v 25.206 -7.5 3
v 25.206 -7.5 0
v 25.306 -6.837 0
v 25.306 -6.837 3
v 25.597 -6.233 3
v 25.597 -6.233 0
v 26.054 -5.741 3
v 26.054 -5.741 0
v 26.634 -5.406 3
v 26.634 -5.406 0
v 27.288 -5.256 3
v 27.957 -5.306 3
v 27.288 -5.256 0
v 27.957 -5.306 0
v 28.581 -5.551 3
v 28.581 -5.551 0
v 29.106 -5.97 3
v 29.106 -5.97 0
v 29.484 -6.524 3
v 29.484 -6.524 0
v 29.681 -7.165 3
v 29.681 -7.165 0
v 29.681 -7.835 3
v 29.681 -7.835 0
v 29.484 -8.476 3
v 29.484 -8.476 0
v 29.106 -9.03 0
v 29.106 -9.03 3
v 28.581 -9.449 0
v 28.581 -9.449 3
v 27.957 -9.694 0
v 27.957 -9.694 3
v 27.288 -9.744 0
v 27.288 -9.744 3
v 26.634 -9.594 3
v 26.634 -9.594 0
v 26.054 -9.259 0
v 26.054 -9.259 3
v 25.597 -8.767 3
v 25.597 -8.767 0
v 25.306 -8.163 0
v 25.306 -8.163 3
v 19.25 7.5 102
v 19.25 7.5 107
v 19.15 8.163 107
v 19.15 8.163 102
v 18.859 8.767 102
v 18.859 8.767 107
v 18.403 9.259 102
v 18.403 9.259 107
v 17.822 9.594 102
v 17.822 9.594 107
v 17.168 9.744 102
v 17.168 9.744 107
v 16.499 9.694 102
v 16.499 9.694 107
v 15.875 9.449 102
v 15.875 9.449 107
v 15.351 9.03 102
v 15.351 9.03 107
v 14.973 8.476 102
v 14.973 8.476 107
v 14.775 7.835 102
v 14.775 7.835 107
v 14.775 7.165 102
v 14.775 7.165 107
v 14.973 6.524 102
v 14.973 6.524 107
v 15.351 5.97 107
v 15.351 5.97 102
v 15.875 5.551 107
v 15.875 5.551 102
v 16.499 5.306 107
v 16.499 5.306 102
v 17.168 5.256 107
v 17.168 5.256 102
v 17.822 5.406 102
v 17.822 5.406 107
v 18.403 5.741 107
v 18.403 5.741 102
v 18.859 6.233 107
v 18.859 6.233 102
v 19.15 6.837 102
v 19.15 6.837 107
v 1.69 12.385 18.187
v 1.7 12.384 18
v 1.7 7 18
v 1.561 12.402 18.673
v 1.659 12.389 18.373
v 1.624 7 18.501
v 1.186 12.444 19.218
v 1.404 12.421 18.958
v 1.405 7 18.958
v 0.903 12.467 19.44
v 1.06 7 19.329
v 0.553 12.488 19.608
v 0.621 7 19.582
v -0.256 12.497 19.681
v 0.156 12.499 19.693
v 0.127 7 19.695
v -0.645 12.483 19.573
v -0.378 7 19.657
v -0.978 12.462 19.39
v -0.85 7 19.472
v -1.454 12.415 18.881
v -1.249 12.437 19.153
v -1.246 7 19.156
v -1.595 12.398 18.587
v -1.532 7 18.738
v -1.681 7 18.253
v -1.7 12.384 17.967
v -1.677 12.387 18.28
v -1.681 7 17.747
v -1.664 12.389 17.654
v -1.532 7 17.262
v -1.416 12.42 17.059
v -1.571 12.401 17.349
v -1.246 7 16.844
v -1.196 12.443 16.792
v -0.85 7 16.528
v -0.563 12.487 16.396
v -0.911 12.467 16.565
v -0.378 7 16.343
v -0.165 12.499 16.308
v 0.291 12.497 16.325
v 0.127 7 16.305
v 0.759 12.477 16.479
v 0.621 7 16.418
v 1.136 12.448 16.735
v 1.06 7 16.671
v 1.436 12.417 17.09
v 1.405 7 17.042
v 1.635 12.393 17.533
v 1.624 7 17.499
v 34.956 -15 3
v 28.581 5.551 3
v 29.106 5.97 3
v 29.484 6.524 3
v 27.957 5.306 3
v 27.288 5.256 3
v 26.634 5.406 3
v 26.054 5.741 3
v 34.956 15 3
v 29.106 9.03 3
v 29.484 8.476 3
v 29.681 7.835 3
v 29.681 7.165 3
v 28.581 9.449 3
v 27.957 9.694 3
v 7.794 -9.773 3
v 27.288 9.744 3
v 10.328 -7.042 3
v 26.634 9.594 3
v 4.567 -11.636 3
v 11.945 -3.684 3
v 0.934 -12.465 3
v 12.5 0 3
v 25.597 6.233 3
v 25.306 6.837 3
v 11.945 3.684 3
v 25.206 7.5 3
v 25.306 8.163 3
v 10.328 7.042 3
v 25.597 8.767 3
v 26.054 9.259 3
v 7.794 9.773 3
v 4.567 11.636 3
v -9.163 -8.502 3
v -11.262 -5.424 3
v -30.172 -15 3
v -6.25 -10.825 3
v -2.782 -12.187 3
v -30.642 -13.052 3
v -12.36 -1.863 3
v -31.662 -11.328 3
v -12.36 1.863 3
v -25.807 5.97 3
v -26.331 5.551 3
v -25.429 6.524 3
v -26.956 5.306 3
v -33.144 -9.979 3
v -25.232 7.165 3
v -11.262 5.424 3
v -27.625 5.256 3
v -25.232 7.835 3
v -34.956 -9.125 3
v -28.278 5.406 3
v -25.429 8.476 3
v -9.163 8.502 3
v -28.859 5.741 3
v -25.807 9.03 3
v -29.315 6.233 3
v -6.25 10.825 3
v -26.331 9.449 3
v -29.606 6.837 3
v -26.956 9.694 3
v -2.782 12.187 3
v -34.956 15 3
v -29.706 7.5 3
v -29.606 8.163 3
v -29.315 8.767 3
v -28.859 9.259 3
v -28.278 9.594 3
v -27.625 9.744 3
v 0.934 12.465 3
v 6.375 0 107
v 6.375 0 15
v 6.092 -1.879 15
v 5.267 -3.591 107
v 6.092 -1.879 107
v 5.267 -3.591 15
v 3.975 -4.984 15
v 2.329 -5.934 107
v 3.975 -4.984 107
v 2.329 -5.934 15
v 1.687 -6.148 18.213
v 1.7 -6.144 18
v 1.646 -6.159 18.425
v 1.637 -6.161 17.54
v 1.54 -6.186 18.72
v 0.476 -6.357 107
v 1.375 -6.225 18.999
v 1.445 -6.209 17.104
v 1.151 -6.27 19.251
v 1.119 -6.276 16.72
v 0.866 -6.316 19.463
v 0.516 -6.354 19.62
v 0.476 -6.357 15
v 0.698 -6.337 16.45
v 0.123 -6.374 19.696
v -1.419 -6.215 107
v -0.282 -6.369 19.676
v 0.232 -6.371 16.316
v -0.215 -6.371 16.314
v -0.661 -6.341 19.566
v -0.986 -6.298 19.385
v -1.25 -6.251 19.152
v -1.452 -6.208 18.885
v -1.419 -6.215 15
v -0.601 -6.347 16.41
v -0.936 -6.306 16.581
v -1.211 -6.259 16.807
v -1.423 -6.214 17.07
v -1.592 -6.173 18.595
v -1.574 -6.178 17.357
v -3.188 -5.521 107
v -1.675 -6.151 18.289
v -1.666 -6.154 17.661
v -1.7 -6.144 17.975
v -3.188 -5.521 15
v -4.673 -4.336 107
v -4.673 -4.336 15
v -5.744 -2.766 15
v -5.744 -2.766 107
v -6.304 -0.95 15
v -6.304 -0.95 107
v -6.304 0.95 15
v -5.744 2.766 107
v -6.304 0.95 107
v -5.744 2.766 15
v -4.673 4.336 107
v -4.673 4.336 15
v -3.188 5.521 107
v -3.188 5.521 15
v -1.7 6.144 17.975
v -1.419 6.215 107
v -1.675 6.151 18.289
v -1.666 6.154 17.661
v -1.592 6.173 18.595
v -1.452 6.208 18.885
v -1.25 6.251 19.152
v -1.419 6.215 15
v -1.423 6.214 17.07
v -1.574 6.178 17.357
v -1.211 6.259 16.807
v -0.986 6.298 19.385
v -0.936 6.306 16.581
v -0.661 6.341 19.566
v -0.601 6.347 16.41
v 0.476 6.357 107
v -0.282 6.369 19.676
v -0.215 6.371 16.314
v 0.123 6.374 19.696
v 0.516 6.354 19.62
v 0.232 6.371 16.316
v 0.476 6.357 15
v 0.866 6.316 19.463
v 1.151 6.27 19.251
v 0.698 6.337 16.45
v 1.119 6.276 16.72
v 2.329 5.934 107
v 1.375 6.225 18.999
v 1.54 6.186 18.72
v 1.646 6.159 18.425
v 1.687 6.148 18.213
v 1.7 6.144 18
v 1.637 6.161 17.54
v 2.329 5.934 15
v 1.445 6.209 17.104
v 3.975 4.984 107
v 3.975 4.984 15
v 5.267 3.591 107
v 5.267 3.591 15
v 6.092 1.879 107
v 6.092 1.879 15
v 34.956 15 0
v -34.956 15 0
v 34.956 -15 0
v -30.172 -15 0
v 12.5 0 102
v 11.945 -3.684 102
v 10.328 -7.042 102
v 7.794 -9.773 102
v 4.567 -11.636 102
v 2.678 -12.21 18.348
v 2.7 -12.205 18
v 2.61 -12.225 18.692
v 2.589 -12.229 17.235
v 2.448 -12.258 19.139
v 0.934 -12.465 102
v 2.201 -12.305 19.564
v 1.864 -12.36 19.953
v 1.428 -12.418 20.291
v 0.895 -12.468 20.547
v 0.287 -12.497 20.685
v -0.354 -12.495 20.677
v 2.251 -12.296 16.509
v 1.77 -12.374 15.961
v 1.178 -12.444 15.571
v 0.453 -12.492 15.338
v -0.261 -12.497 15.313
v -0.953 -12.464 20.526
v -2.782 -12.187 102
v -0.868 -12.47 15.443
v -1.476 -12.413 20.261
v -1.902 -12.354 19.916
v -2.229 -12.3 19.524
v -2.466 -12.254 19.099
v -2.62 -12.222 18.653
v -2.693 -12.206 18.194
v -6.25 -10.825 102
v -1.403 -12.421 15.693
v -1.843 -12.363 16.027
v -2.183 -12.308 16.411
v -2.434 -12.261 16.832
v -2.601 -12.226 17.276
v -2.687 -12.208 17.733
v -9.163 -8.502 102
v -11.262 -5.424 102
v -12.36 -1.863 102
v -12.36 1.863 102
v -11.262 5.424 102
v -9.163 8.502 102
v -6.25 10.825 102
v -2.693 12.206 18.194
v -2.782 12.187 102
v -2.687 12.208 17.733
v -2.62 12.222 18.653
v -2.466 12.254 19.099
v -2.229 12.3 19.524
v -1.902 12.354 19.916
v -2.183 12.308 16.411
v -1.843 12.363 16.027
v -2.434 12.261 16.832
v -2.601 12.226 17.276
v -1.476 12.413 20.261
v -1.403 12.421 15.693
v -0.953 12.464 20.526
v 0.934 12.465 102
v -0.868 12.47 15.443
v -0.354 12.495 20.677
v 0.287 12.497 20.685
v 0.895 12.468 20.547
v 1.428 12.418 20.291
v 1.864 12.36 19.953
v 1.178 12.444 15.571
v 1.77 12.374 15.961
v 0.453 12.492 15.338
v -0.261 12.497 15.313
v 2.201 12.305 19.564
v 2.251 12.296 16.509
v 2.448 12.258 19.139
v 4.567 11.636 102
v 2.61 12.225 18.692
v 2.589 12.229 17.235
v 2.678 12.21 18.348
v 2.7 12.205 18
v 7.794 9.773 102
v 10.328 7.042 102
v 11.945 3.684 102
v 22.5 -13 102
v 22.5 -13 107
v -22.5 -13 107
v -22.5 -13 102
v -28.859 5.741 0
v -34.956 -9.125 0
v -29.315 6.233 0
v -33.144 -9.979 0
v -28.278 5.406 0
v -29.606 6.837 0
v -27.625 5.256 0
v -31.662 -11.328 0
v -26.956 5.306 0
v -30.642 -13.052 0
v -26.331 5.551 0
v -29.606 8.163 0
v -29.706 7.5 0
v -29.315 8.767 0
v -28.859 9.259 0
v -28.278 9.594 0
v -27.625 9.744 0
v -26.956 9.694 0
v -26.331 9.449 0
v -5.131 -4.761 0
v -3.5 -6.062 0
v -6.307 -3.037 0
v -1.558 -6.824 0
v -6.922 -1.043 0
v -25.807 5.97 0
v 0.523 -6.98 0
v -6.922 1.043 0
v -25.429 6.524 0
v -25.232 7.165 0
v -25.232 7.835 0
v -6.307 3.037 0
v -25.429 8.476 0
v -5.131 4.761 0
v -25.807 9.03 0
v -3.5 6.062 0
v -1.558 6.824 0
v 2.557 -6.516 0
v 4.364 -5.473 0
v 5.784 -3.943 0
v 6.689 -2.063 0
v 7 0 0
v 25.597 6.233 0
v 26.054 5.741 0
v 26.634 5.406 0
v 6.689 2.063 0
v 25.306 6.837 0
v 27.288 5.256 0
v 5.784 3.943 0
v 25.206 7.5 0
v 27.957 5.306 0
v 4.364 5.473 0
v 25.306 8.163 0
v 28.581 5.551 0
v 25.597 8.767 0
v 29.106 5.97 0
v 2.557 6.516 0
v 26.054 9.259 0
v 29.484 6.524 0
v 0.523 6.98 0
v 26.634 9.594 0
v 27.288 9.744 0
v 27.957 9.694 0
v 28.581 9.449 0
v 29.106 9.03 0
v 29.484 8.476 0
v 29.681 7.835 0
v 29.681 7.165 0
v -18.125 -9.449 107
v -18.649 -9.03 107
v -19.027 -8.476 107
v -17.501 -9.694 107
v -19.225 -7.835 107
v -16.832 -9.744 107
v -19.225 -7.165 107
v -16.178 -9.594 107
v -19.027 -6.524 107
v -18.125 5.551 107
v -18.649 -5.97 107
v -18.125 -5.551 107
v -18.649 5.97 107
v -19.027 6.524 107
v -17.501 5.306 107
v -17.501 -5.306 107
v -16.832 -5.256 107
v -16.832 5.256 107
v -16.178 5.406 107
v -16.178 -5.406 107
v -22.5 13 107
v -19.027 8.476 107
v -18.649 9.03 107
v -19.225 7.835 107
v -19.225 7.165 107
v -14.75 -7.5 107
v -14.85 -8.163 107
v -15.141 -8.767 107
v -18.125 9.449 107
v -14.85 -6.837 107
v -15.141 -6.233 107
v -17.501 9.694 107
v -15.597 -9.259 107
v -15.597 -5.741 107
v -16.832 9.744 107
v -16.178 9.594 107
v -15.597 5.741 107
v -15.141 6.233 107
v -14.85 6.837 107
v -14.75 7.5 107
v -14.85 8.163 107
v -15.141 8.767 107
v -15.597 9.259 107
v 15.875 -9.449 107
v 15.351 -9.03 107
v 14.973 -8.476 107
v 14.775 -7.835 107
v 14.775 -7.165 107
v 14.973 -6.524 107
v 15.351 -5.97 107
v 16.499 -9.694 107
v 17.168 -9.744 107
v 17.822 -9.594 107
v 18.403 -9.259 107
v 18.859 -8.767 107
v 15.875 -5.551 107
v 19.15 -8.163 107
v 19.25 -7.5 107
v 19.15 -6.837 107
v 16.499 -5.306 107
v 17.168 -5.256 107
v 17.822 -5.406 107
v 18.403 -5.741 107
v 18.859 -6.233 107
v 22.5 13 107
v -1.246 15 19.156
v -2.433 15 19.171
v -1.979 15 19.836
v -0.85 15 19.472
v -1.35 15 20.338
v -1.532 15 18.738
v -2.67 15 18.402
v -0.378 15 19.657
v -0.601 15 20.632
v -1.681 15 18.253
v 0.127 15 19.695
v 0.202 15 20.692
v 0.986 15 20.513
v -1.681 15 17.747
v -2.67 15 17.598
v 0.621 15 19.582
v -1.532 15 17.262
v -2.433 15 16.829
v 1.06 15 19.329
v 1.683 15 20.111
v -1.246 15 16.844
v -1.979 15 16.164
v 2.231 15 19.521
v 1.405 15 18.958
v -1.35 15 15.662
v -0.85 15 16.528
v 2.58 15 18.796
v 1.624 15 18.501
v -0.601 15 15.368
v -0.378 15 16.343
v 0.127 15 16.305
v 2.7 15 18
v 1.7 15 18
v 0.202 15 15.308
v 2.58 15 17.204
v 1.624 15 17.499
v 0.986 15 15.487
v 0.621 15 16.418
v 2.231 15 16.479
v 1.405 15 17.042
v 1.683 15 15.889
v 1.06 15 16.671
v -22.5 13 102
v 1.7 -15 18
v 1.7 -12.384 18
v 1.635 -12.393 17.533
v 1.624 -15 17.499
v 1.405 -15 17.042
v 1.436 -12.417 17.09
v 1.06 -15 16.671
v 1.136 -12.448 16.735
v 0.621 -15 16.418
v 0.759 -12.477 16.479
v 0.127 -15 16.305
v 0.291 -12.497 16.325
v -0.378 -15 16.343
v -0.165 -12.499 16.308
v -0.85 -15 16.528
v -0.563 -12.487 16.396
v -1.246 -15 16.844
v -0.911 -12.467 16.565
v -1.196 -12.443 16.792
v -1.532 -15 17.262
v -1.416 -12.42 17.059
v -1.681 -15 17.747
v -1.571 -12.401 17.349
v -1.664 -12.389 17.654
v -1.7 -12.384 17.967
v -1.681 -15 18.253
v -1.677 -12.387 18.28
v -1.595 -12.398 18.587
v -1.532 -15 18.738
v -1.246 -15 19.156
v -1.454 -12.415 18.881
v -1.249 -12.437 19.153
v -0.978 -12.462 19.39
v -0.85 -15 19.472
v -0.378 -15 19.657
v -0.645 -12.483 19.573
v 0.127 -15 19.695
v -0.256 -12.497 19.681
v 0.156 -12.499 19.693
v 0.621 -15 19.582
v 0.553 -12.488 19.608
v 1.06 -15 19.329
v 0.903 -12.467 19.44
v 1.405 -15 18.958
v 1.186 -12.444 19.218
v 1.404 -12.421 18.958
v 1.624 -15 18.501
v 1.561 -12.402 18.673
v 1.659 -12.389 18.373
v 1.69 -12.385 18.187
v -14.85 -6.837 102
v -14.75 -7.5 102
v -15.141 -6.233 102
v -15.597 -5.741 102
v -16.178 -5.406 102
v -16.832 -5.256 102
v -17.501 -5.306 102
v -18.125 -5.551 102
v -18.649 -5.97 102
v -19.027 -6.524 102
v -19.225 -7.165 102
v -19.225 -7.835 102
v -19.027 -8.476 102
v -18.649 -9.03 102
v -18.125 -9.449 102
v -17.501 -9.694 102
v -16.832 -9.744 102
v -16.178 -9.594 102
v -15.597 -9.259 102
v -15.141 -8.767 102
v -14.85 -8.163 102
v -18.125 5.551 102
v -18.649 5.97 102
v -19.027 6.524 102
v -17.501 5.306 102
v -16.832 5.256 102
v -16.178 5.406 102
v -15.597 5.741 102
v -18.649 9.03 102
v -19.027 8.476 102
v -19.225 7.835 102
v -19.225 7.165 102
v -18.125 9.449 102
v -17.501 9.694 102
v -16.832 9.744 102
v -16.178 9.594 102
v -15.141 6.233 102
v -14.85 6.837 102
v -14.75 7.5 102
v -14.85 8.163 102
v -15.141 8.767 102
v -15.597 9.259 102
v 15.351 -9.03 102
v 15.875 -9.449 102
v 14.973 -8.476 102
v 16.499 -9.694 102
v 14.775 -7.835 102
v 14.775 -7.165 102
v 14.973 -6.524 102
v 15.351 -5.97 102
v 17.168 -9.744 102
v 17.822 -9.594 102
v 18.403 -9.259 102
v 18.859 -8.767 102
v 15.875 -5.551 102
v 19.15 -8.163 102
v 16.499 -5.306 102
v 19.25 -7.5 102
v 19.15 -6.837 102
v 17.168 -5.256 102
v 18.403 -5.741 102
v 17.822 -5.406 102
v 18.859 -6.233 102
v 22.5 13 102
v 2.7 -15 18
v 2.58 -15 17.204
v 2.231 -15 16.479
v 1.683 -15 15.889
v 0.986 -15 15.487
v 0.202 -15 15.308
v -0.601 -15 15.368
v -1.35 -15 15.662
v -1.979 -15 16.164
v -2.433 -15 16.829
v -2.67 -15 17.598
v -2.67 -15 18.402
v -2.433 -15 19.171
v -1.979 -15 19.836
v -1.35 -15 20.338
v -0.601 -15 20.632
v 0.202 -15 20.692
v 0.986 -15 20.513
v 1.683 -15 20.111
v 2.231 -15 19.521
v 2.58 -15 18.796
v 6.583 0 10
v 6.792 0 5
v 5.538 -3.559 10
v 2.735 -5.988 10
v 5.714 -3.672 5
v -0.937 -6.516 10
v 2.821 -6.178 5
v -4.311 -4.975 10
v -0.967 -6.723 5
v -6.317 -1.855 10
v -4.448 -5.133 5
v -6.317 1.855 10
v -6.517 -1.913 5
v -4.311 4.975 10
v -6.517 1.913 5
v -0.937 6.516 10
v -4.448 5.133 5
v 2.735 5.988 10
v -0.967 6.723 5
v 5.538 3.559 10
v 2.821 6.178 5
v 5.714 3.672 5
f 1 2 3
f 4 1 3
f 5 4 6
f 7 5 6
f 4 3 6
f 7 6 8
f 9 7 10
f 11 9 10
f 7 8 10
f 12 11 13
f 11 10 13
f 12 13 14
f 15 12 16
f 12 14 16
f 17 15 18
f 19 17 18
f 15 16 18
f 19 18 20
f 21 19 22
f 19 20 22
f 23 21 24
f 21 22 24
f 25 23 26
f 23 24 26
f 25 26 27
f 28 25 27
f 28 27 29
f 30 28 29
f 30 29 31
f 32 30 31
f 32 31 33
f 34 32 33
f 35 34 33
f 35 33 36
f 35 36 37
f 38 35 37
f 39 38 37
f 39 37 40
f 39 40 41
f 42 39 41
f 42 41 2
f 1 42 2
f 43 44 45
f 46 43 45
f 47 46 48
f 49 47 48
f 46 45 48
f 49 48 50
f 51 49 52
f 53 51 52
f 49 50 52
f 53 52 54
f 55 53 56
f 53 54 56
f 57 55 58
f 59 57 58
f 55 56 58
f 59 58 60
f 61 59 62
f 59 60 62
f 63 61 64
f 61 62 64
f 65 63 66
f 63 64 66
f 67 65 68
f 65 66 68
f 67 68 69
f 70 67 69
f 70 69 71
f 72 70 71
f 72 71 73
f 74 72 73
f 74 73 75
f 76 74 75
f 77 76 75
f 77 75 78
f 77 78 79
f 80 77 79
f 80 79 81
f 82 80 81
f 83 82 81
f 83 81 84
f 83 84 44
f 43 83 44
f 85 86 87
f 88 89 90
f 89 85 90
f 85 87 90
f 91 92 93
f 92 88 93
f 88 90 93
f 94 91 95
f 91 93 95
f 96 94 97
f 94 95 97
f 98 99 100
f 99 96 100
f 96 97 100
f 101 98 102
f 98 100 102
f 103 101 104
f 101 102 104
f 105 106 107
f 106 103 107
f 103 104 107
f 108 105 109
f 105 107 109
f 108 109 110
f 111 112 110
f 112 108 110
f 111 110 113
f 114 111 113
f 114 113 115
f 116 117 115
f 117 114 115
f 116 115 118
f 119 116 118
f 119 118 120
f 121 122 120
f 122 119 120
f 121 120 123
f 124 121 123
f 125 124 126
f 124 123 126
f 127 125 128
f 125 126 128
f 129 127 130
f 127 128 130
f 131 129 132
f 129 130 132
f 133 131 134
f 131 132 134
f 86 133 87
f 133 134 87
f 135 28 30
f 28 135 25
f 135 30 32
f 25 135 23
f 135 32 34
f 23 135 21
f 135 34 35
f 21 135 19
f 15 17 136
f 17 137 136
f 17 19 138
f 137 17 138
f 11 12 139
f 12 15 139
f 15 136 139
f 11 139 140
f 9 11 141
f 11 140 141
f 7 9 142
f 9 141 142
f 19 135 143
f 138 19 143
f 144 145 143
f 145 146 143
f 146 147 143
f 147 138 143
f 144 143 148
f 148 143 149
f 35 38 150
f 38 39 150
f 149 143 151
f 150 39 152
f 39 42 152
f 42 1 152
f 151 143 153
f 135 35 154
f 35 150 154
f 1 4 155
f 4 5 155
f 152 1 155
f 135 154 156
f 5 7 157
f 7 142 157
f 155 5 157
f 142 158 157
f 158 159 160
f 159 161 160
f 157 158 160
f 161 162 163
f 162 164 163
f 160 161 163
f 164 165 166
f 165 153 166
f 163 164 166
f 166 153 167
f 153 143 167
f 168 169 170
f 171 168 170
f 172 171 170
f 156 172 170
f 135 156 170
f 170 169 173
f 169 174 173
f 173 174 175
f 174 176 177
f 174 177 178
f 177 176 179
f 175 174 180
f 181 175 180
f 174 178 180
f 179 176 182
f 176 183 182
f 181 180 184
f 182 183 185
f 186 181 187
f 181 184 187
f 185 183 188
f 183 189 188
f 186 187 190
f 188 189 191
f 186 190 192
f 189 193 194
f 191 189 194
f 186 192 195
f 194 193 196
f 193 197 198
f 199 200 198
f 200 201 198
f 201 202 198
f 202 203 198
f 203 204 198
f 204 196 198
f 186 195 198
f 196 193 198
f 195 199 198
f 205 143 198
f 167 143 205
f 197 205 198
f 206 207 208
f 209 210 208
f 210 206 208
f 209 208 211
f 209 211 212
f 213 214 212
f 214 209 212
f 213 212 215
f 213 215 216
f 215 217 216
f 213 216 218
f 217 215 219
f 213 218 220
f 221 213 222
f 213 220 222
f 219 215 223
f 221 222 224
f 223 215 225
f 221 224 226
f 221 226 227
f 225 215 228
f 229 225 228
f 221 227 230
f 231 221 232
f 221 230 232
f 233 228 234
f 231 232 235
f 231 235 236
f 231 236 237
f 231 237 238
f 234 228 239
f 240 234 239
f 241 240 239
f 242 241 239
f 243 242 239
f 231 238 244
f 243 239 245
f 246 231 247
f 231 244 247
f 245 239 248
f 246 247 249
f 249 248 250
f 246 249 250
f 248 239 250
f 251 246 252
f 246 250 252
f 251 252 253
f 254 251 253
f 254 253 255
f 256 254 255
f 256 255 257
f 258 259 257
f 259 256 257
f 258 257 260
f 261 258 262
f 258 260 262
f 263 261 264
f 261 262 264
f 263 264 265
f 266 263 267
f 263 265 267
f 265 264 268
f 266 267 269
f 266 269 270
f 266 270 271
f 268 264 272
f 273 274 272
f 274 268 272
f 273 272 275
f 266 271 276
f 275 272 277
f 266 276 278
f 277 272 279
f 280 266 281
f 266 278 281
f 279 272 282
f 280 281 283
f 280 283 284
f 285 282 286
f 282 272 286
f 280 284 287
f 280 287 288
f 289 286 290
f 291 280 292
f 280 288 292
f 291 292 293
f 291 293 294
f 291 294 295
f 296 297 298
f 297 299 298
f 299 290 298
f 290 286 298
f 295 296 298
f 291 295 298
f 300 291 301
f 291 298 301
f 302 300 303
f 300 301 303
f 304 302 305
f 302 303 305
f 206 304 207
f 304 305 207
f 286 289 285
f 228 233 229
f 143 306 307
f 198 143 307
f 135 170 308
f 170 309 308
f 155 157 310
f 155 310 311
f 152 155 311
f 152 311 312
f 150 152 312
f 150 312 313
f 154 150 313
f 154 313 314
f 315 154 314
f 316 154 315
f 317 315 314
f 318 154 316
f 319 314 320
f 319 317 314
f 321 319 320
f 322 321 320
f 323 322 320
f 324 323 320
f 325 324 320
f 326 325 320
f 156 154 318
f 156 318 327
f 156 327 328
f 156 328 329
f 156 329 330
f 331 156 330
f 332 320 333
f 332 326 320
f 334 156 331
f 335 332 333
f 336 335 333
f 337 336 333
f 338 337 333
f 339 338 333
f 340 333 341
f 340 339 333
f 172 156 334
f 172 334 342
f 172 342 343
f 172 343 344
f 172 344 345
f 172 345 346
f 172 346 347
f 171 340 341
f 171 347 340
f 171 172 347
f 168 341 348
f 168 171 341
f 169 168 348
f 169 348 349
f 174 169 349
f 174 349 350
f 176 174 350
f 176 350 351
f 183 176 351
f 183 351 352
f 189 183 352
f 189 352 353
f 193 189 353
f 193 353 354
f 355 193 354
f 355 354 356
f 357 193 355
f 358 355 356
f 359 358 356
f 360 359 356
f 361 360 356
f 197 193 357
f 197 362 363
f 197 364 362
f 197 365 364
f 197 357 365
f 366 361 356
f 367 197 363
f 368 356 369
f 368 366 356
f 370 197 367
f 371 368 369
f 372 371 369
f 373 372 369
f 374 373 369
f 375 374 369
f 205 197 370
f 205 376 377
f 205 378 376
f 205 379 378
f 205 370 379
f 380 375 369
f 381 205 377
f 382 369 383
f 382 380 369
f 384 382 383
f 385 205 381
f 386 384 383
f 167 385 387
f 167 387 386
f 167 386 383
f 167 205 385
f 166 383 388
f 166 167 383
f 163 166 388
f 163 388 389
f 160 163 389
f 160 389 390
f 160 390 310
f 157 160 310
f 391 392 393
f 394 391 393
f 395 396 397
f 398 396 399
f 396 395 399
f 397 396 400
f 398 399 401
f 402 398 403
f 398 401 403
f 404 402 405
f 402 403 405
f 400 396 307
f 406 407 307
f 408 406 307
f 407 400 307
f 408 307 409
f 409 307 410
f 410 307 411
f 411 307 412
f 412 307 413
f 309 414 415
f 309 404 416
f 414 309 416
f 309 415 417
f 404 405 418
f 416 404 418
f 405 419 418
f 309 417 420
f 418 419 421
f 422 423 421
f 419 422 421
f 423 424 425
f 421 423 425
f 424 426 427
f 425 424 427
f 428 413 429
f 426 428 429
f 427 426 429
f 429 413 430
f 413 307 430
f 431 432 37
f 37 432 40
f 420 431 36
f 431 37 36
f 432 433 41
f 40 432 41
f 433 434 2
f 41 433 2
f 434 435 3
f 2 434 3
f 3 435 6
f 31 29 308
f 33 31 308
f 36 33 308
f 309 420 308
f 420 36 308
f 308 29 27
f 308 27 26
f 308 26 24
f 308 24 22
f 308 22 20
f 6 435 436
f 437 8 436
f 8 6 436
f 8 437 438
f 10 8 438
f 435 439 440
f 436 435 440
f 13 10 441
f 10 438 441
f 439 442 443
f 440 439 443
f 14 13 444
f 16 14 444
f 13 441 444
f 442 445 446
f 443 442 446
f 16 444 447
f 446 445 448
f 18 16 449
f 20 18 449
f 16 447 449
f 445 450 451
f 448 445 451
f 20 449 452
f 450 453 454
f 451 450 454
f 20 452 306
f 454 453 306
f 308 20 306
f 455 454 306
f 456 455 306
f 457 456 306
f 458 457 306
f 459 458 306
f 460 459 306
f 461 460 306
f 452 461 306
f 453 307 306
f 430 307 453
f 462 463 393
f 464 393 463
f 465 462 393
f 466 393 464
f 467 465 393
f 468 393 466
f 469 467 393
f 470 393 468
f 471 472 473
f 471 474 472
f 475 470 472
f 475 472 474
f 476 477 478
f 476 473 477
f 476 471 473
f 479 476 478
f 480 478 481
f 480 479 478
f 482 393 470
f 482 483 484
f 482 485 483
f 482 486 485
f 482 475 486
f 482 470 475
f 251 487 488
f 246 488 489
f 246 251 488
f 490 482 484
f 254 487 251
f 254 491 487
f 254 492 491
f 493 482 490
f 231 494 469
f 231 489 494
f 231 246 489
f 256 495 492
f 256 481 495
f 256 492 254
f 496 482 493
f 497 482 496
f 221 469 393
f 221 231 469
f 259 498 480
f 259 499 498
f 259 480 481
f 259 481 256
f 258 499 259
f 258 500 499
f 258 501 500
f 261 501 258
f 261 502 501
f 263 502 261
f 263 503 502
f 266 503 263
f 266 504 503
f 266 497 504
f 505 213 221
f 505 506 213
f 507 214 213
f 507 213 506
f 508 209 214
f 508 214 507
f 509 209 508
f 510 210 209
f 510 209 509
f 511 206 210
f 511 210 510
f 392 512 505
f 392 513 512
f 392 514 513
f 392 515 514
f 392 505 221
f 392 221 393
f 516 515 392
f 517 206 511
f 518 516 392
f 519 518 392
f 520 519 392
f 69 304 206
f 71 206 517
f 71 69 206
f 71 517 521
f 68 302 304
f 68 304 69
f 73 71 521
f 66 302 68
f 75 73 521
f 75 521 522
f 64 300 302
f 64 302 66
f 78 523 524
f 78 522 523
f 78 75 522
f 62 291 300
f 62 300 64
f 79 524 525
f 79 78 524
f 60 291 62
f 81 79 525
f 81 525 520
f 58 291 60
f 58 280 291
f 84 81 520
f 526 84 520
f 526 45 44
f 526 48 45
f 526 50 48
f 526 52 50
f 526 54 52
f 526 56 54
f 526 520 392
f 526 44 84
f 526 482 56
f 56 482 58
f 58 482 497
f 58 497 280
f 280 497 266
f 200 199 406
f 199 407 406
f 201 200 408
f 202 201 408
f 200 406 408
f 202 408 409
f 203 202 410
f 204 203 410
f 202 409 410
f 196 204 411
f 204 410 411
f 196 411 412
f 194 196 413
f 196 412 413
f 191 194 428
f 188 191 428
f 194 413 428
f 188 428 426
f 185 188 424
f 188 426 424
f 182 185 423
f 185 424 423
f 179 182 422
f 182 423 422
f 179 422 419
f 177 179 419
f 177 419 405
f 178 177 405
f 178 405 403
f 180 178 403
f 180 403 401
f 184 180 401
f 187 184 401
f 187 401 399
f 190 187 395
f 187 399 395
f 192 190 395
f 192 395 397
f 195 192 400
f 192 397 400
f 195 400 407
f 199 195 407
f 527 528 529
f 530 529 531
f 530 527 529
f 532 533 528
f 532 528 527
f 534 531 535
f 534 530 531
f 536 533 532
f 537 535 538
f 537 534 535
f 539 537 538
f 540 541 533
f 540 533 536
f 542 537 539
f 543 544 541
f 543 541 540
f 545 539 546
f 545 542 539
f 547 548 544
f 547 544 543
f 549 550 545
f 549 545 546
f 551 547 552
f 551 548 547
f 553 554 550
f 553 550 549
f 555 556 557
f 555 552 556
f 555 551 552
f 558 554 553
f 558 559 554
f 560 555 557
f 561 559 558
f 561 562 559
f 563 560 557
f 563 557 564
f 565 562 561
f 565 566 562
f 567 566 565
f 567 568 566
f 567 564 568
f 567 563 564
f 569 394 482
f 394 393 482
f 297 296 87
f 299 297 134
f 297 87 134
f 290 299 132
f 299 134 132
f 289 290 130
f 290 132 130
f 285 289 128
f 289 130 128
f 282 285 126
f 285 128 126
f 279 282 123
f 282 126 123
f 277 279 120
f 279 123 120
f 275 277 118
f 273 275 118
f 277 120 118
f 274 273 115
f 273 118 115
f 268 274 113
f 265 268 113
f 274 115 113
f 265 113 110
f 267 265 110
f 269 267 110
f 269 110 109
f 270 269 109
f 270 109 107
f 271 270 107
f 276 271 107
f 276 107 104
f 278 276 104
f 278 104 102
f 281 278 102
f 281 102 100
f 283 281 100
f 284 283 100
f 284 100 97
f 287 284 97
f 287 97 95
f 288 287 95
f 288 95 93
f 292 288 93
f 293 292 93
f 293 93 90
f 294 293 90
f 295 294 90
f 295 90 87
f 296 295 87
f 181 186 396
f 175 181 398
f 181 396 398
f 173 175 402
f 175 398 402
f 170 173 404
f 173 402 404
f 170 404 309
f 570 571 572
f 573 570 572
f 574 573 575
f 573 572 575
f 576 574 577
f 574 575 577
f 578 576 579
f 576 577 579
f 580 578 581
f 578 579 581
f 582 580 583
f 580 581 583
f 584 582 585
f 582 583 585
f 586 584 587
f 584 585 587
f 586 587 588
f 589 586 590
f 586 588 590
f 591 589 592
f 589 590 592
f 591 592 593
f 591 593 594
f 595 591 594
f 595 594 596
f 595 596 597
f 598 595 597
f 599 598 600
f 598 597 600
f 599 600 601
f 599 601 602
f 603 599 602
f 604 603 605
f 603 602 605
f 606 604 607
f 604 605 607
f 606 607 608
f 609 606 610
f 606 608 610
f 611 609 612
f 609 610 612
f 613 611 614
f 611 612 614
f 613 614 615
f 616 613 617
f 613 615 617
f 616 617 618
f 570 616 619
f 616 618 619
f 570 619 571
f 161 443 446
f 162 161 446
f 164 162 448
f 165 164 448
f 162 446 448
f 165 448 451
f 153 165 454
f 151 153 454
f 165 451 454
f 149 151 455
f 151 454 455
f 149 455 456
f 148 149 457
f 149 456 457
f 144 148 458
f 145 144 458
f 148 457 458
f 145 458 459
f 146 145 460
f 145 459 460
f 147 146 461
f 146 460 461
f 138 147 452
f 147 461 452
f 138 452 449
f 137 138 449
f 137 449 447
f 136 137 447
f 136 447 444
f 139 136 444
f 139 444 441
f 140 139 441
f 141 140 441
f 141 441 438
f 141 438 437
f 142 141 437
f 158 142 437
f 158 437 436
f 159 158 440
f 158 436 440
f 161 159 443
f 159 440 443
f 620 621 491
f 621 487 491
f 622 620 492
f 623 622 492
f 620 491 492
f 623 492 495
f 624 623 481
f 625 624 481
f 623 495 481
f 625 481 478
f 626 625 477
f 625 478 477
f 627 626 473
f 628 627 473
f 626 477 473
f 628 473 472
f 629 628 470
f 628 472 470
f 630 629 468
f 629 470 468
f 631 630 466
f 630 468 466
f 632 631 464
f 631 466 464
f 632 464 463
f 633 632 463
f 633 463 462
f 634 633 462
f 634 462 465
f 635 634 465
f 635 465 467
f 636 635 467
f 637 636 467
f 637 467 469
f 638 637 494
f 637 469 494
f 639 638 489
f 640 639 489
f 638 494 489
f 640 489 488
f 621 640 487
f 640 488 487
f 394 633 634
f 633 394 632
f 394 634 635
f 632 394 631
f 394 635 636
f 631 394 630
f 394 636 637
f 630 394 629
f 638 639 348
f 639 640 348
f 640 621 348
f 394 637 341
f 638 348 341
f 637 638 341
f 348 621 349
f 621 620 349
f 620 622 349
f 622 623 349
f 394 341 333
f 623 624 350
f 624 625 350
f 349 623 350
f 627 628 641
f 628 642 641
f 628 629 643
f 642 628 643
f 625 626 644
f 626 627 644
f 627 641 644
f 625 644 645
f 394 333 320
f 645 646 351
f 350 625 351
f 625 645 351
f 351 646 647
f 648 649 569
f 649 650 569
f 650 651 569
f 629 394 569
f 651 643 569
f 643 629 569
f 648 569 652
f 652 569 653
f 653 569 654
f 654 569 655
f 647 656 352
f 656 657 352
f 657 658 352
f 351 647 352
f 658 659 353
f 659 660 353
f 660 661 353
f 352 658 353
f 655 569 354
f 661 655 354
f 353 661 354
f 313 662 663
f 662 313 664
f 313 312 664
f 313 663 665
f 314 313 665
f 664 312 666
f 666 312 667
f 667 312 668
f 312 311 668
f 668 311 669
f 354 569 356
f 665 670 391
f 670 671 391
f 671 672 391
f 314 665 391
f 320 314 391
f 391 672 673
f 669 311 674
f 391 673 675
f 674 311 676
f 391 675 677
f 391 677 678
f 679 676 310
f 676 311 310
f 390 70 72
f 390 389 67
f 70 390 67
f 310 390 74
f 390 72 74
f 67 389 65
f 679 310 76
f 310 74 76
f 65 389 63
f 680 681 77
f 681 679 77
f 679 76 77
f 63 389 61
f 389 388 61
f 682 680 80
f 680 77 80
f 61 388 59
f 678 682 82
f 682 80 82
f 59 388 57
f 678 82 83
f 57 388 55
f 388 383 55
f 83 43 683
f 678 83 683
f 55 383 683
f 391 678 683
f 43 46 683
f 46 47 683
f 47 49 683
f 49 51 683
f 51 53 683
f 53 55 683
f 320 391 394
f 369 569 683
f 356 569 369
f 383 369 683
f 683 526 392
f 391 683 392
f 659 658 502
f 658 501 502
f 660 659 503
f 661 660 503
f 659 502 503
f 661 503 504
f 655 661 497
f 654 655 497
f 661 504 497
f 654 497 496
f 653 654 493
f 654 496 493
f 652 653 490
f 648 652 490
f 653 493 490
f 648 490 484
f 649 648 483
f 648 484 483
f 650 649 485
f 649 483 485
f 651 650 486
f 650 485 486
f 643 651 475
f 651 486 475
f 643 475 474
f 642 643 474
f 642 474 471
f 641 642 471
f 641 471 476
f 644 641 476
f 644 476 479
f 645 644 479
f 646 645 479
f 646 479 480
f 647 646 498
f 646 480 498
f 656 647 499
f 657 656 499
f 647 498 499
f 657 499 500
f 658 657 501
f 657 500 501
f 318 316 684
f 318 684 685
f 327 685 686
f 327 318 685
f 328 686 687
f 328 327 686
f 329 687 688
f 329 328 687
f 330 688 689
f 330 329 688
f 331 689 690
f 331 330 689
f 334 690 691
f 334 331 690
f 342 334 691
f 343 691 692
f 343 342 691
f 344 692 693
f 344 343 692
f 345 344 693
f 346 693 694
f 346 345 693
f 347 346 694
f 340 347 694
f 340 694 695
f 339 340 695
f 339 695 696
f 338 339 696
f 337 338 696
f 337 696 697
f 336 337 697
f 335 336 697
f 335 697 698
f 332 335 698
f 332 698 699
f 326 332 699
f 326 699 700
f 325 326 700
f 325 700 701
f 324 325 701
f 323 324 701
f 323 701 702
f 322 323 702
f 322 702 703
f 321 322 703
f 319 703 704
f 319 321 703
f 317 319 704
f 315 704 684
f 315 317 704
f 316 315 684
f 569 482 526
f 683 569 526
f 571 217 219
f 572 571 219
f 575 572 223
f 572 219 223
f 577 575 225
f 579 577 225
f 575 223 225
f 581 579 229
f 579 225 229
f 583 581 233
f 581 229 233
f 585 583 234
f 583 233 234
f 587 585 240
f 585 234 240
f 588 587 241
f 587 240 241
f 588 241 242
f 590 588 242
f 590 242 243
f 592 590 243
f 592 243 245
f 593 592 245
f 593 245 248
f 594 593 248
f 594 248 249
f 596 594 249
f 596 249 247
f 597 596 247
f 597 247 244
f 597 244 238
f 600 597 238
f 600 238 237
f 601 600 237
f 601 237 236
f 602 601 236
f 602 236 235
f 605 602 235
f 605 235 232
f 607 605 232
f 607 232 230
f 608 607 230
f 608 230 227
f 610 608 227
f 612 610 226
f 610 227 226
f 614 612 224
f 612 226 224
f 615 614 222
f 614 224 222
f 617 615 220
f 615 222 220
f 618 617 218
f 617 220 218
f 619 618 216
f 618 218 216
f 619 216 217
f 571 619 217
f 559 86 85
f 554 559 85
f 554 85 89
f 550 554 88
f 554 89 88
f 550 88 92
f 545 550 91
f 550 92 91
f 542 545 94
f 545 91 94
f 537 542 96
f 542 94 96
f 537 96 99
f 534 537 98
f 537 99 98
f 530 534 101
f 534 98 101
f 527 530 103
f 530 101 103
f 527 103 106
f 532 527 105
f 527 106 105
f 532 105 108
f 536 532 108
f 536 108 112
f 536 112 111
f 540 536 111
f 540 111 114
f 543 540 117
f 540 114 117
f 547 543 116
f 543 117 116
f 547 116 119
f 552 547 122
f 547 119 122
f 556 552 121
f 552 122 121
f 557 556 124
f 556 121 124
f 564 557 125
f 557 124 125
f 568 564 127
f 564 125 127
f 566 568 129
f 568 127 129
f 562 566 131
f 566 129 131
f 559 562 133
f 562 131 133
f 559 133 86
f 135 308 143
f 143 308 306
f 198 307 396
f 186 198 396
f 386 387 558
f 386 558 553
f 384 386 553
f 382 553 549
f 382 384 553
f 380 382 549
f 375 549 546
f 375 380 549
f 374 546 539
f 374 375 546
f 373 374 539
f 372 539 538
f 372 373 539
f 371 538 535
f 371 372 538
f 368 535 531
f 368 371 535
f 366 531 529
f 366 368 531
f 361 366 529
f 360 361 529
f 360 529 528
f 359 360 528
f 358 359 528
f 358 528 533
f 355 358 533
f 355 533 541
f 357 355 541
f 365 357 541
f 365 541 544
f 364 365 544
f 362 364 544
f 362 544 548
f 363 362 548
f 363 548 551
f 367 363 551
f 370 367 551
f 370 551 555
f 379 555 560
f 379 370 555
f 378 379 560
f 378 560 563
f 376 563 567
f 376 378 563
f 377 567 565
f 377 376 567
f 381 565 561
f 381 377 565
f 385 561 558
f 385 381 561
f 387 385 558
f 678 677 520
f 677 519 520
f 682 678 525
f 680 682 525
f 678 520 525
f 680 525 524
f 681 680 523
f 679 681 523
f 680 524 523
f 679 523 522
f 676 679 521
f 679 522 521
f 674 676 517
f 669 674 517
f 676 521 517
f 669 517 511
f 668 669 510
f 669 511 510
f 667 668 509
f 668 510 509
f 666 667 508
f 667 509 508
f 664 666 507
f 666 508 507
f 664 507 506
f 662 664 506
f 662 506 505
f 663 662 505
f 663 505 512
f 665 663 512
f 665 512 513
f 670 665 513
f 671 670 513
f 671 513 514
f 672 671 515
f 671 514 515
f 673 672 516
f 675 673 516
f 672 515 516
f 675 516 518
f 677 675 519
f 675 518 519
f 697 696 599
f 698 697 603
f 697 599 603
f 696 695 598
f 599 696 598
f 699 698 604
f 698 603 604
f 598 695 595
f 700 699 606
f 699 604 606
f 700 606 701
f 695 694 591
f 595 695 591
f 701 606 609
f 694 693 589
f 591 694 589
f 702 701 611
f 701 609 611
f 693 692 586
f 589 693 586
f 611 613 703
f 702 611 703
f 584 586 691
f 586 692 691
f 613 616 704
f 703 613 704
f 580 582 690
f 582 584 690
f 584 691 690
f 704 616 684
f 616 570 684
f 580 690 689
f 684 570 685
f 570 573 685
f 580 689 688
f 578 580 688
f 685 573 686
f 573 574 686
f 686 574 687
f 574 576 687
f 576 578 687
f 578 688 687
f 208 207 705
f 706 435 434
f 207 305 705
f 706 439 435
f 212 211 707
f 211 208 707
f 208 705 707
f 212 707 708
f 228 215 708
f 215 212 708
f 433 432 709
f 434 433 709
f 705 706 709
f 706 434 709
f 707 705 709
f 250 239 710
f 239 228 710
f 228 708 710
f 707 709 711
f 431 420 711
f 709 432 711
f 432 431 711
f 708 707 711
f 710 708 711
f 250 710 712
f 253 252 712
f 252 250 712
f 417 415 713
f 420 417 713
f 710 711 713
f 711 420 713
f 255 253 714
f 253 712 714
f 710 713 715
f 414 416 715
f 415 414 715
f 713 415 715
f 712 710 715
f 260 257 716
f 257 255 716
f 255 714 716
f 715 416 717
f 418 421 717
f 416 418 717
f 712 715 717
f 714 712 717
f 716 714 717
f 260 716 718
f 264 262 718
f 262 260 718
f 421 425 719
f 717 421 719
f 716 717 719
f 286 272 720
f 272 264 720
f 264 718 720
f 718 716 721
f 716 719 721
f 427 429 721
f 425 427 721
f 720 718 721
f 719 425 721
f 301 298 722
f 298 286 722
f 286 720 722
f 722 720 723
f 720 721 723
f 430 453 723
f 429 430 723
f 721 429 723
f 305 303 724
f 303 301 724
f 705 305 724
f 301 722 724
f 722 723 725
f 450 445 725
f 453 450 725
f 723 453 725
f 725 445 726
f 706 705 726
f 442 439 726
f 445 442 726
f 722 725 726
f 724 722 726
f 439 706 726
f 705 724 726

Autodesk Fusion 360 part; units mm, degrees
sketch "Sketch1" plane through (0, 0, 0) normal (0, 0, 1) x (1, 0, 0)
  circle A0 centre (0, 0) radius 7
  circle A1 centre (0, 0) radius 12.5
  dimension "d1" = 25
  dimension "d2" = 14
extrude "Extrude1" add sketch "Sketch1" along normal blind 15 contours A0 | A1
sketch "Sketch2" plane through (0, 0, 15) normal (0, 0, 1) x (1, 0, 0)
  circle A0 centre (0, 0) radius 12.5
  circle A1 centre (0, 0) radius 6.375
  dimension "d5" = 12.75
loft "Loft1" cut profiles "Sketch1", "Sketch2" section 1 contours A0 section 2 contours A1
extrude "Extrude2" add 1 faces at (10.4118, -0.621, 15) along direction (0, 0, 1) blind 92
sketch "Sketch17" plane through (0, 0, 107) normal (0, 0, 1) x (1, 0, 0)
  circle A0 centre (-17, -7.5) radius 2.25
  circle A1 centre (17, -7.5) radius 2.25
  circle A2 centre (0, 0) radius 6.375
  circle A3 centre (0, 0) radius 12.5
  line L0 (-22.5, 13) -> (22.5, 13)
  line L1 (22.5, 13) -> (22.5, -13)
  line L2 (22.5, -13) -> (-22.5, -13)
  line L3 (-22.5, -13) -> (-22.5, 13)
  line L4 (0, 0) -> (-22.5, 0) construction
  line L5 (0, 0) -> (22.5, 0) construction
  circle A4 centre (-17, 7.5) radius 2.25
  circle A5 centre (17, 7.5) radius 2.25
  point P0 (-12.5, 0)
  point P1 (12.5, 0)
  dimension "d112" = 4.5
  dimension "d113" = 4.5
  dimension "d147" = 10
  dimension "d148" = 10
  dimension "d149" = 7.5
  dimension "d150" = 13
  dimension "d151" = 17
  dimension "d152" = 17
  dimension "d153" = 7.5
  dimension "d154" = 17
  dimension "d155" = 7.5
  dimension "d156" = 4.5
  dimension "d157" = 4.5
  dimension "d158" = 17
  dimension "d159" = 7.5
extrude "Extrude15" add sketch "Sketch17" against normal blind 5 contours A3 | L0 L1 L2 L3
sketch "Sketch18" plane through (0, 0, 0) normal (0, 0, -1) x (-1, 0, 0)
  circle A0 centre (-17, -7.5) radius 2.25
  circle A1 centre (17, -7.5) radius 2.25
  line L0 (-34.9564, 15) -> (34.9564, 15)
  line L1 (34.9564, 15) -> (34.9564, -15)
  line L2 (34.9564, -15) -> (-34.9564, -15)
  line L3 (-34.9564, -15) -> (-34.9564, 15)
  circle A2 centre (-27.4564, -7.5) radius 2.25
  circle A3 centre (0, 0) radius 7
  circle A4 centre (0, 0) radius 12.5
  line L4 (-22.5, -13) -> (22.5, -13)
  line L5 (22.5, -13) -> (22.5, 13)
  line L6 (22.5, 13) -> (-22.5, 13)
  line L7 (-22.5, 13) -> (-22.5, -13)
  circle A5 centre (0, 0) radius 12.5
  circle A6 centre (-17, 7.5) radius 2.25
  circle A7 centre (17, 7.5) radius 2.25
  circle A8 centre (-27.4564, 7.5) radius 2.25
  circle A9 centre (27.4564, 7.5) radius 2.25
  point P0 (0, -15)
  dimension "d122" = 4.5
  dimension "d124" = 7.5
  dimension "d125" = 7.5
  dimension "d160" = 34.9564
  dimension "d161" = 15
  dimension "d162" = 34.9564
  dimension "d163" = 15
  dimension "d164" = 7.5
  dimension "d165" = 7.5
  dimension "d166" = 4.5
  dimension "d167" = 7.5
  dimension "d168" = 7.5
  dimension "d169" = 4.5
extrude "Extrude16" add sketch "Sketch18" against normal blind 3 contours A0 | A1 | L0 L1 L2 L3 | L4 L5 L6 L7 | A6 | A7
ref_plane "WorkPlane5" through (0, -7, 0) normal (0, 1, 0) x (0, 0, 1)
sketch "Sketch19" plane through (0, -7, 0) normal (0, 1, 0) x (1, 0, 0)
  line L0 (6.375, -15) -> (-6.375, -15)
  line L1 (0, -15) -> (0, -107) construction
  circle A0 centre (0, -18) radius 1.7
  circle A1 centre (0, -18) radius 2.7
  line L2 (6.375, -107) -> (-6.375, -107)
  dimension "d131" = 3.4
  dimension "d132" = 5.4
  dimension "d139" = 3
extrude "Extrude17" add sketch "Sketch19" against normal blind 8
extrude "Extrude18" cut sketch "Sketch19" along normal blind 2 and the other way blind 8 contours A0
ref_plane "WorkPlane7" through (0, 7, 0) normal (0, 1, 0) x (0, 0, 1)
sketch "Sketch22" plane through (0, 7, 0) normal (0, 1, 0) x (1, 0, 0)
  circle A0 centre (0, -18) radius 1.7
  circle A1 centre (0, -18) radius 2.7
  point P0 (0, -18)
  dimension "d171" = 3.4
  dimension "d172" = 5.4
extrude "Extrude21" add sketch "Sketch22" along normal blind 8
extrude "Extrude22" cut sketch "Sketch22" along normal blind 8 and the other way blind 2 contours A0
sketch "Sketch23" plane through (0, 0, 0) normal (0, 0, -1) x (-1, 0, 0)
  line L0 (-34.9564, -15) -> (34.9564, -15)
  line L1 (34.9564, -15) -> (34.9564, 15)
  line L2 (34.9564, 15) -> (-34.9564, 15)
  line L3 (-34.9564, 15) -> (-34.9564, -15)
  circle A0 centre (-27.4564, 7.5) radius 2.25
  circle A1 centre (-27.4564, -7.5) radius 2.25
  circle A2 centre (27.4564, 7.5) radius 2.25
  circle A3 centre (0, 0) radius 7
  line L4 (34.9564, -15) -> (30.1724, -15)
  line L5 (34.9564, -9.125) -> (34.9564, -15)
  arc A4 (34.9564, -9.125) -> (30.1724, -15) centre (36.8966, -15.5902) ccw
  dimension "d181" = 4.784
  dimension "d182" = 5.875
  dimension "d183" = 6.75
extrude "Extrude23" cut sketch "Sketch23" against normal up to surface (3 mm away) contours L0 L1 L4 L5 A4
equation "d110 = 15 mm"
equation "d113 = d112"
equation "d116 = d110 / 2"
equation "d125 = d124"
equation "d130 = -d2 / 2"
equation "d132 = d131 + 2 mm"
equation "d148 = d147"
equation "d152 = d151"
equation "d153 = d149"
equation "d154 = d151"
equation "d155 = d149"
equation "d156 = d112"
equation "d157 = d112"
equation "d158 = d151"
equation "d159 = d149"
equation "d162 = d160"
equation "d163 = d161"
equation "d164 = d124"
equation "d165 = d124"
equation "d166 = d122"
equation "d167 = d124"
equation "d168 = d124"
equation "d169 = d122"
equation "d170 = ( d2 / 2 mm ) * 1 mm"
equation "d172 = d171 + 2 mm"
equation "d64 = d67"
equation "d67 = 40.00 mm"
equation "d70 = d67"
equation "d82 = -d67"
equation "d96 = d26 / 2"
equation "d97 = d16 / 2"
equation "d101 = -d29"
equation "d105 = -d29"
equation "d114 = 17 mm"
equation "d115 = d114"
equation "d117 = d116"
equation "d126 = d124"
equation "d127 = d124"
